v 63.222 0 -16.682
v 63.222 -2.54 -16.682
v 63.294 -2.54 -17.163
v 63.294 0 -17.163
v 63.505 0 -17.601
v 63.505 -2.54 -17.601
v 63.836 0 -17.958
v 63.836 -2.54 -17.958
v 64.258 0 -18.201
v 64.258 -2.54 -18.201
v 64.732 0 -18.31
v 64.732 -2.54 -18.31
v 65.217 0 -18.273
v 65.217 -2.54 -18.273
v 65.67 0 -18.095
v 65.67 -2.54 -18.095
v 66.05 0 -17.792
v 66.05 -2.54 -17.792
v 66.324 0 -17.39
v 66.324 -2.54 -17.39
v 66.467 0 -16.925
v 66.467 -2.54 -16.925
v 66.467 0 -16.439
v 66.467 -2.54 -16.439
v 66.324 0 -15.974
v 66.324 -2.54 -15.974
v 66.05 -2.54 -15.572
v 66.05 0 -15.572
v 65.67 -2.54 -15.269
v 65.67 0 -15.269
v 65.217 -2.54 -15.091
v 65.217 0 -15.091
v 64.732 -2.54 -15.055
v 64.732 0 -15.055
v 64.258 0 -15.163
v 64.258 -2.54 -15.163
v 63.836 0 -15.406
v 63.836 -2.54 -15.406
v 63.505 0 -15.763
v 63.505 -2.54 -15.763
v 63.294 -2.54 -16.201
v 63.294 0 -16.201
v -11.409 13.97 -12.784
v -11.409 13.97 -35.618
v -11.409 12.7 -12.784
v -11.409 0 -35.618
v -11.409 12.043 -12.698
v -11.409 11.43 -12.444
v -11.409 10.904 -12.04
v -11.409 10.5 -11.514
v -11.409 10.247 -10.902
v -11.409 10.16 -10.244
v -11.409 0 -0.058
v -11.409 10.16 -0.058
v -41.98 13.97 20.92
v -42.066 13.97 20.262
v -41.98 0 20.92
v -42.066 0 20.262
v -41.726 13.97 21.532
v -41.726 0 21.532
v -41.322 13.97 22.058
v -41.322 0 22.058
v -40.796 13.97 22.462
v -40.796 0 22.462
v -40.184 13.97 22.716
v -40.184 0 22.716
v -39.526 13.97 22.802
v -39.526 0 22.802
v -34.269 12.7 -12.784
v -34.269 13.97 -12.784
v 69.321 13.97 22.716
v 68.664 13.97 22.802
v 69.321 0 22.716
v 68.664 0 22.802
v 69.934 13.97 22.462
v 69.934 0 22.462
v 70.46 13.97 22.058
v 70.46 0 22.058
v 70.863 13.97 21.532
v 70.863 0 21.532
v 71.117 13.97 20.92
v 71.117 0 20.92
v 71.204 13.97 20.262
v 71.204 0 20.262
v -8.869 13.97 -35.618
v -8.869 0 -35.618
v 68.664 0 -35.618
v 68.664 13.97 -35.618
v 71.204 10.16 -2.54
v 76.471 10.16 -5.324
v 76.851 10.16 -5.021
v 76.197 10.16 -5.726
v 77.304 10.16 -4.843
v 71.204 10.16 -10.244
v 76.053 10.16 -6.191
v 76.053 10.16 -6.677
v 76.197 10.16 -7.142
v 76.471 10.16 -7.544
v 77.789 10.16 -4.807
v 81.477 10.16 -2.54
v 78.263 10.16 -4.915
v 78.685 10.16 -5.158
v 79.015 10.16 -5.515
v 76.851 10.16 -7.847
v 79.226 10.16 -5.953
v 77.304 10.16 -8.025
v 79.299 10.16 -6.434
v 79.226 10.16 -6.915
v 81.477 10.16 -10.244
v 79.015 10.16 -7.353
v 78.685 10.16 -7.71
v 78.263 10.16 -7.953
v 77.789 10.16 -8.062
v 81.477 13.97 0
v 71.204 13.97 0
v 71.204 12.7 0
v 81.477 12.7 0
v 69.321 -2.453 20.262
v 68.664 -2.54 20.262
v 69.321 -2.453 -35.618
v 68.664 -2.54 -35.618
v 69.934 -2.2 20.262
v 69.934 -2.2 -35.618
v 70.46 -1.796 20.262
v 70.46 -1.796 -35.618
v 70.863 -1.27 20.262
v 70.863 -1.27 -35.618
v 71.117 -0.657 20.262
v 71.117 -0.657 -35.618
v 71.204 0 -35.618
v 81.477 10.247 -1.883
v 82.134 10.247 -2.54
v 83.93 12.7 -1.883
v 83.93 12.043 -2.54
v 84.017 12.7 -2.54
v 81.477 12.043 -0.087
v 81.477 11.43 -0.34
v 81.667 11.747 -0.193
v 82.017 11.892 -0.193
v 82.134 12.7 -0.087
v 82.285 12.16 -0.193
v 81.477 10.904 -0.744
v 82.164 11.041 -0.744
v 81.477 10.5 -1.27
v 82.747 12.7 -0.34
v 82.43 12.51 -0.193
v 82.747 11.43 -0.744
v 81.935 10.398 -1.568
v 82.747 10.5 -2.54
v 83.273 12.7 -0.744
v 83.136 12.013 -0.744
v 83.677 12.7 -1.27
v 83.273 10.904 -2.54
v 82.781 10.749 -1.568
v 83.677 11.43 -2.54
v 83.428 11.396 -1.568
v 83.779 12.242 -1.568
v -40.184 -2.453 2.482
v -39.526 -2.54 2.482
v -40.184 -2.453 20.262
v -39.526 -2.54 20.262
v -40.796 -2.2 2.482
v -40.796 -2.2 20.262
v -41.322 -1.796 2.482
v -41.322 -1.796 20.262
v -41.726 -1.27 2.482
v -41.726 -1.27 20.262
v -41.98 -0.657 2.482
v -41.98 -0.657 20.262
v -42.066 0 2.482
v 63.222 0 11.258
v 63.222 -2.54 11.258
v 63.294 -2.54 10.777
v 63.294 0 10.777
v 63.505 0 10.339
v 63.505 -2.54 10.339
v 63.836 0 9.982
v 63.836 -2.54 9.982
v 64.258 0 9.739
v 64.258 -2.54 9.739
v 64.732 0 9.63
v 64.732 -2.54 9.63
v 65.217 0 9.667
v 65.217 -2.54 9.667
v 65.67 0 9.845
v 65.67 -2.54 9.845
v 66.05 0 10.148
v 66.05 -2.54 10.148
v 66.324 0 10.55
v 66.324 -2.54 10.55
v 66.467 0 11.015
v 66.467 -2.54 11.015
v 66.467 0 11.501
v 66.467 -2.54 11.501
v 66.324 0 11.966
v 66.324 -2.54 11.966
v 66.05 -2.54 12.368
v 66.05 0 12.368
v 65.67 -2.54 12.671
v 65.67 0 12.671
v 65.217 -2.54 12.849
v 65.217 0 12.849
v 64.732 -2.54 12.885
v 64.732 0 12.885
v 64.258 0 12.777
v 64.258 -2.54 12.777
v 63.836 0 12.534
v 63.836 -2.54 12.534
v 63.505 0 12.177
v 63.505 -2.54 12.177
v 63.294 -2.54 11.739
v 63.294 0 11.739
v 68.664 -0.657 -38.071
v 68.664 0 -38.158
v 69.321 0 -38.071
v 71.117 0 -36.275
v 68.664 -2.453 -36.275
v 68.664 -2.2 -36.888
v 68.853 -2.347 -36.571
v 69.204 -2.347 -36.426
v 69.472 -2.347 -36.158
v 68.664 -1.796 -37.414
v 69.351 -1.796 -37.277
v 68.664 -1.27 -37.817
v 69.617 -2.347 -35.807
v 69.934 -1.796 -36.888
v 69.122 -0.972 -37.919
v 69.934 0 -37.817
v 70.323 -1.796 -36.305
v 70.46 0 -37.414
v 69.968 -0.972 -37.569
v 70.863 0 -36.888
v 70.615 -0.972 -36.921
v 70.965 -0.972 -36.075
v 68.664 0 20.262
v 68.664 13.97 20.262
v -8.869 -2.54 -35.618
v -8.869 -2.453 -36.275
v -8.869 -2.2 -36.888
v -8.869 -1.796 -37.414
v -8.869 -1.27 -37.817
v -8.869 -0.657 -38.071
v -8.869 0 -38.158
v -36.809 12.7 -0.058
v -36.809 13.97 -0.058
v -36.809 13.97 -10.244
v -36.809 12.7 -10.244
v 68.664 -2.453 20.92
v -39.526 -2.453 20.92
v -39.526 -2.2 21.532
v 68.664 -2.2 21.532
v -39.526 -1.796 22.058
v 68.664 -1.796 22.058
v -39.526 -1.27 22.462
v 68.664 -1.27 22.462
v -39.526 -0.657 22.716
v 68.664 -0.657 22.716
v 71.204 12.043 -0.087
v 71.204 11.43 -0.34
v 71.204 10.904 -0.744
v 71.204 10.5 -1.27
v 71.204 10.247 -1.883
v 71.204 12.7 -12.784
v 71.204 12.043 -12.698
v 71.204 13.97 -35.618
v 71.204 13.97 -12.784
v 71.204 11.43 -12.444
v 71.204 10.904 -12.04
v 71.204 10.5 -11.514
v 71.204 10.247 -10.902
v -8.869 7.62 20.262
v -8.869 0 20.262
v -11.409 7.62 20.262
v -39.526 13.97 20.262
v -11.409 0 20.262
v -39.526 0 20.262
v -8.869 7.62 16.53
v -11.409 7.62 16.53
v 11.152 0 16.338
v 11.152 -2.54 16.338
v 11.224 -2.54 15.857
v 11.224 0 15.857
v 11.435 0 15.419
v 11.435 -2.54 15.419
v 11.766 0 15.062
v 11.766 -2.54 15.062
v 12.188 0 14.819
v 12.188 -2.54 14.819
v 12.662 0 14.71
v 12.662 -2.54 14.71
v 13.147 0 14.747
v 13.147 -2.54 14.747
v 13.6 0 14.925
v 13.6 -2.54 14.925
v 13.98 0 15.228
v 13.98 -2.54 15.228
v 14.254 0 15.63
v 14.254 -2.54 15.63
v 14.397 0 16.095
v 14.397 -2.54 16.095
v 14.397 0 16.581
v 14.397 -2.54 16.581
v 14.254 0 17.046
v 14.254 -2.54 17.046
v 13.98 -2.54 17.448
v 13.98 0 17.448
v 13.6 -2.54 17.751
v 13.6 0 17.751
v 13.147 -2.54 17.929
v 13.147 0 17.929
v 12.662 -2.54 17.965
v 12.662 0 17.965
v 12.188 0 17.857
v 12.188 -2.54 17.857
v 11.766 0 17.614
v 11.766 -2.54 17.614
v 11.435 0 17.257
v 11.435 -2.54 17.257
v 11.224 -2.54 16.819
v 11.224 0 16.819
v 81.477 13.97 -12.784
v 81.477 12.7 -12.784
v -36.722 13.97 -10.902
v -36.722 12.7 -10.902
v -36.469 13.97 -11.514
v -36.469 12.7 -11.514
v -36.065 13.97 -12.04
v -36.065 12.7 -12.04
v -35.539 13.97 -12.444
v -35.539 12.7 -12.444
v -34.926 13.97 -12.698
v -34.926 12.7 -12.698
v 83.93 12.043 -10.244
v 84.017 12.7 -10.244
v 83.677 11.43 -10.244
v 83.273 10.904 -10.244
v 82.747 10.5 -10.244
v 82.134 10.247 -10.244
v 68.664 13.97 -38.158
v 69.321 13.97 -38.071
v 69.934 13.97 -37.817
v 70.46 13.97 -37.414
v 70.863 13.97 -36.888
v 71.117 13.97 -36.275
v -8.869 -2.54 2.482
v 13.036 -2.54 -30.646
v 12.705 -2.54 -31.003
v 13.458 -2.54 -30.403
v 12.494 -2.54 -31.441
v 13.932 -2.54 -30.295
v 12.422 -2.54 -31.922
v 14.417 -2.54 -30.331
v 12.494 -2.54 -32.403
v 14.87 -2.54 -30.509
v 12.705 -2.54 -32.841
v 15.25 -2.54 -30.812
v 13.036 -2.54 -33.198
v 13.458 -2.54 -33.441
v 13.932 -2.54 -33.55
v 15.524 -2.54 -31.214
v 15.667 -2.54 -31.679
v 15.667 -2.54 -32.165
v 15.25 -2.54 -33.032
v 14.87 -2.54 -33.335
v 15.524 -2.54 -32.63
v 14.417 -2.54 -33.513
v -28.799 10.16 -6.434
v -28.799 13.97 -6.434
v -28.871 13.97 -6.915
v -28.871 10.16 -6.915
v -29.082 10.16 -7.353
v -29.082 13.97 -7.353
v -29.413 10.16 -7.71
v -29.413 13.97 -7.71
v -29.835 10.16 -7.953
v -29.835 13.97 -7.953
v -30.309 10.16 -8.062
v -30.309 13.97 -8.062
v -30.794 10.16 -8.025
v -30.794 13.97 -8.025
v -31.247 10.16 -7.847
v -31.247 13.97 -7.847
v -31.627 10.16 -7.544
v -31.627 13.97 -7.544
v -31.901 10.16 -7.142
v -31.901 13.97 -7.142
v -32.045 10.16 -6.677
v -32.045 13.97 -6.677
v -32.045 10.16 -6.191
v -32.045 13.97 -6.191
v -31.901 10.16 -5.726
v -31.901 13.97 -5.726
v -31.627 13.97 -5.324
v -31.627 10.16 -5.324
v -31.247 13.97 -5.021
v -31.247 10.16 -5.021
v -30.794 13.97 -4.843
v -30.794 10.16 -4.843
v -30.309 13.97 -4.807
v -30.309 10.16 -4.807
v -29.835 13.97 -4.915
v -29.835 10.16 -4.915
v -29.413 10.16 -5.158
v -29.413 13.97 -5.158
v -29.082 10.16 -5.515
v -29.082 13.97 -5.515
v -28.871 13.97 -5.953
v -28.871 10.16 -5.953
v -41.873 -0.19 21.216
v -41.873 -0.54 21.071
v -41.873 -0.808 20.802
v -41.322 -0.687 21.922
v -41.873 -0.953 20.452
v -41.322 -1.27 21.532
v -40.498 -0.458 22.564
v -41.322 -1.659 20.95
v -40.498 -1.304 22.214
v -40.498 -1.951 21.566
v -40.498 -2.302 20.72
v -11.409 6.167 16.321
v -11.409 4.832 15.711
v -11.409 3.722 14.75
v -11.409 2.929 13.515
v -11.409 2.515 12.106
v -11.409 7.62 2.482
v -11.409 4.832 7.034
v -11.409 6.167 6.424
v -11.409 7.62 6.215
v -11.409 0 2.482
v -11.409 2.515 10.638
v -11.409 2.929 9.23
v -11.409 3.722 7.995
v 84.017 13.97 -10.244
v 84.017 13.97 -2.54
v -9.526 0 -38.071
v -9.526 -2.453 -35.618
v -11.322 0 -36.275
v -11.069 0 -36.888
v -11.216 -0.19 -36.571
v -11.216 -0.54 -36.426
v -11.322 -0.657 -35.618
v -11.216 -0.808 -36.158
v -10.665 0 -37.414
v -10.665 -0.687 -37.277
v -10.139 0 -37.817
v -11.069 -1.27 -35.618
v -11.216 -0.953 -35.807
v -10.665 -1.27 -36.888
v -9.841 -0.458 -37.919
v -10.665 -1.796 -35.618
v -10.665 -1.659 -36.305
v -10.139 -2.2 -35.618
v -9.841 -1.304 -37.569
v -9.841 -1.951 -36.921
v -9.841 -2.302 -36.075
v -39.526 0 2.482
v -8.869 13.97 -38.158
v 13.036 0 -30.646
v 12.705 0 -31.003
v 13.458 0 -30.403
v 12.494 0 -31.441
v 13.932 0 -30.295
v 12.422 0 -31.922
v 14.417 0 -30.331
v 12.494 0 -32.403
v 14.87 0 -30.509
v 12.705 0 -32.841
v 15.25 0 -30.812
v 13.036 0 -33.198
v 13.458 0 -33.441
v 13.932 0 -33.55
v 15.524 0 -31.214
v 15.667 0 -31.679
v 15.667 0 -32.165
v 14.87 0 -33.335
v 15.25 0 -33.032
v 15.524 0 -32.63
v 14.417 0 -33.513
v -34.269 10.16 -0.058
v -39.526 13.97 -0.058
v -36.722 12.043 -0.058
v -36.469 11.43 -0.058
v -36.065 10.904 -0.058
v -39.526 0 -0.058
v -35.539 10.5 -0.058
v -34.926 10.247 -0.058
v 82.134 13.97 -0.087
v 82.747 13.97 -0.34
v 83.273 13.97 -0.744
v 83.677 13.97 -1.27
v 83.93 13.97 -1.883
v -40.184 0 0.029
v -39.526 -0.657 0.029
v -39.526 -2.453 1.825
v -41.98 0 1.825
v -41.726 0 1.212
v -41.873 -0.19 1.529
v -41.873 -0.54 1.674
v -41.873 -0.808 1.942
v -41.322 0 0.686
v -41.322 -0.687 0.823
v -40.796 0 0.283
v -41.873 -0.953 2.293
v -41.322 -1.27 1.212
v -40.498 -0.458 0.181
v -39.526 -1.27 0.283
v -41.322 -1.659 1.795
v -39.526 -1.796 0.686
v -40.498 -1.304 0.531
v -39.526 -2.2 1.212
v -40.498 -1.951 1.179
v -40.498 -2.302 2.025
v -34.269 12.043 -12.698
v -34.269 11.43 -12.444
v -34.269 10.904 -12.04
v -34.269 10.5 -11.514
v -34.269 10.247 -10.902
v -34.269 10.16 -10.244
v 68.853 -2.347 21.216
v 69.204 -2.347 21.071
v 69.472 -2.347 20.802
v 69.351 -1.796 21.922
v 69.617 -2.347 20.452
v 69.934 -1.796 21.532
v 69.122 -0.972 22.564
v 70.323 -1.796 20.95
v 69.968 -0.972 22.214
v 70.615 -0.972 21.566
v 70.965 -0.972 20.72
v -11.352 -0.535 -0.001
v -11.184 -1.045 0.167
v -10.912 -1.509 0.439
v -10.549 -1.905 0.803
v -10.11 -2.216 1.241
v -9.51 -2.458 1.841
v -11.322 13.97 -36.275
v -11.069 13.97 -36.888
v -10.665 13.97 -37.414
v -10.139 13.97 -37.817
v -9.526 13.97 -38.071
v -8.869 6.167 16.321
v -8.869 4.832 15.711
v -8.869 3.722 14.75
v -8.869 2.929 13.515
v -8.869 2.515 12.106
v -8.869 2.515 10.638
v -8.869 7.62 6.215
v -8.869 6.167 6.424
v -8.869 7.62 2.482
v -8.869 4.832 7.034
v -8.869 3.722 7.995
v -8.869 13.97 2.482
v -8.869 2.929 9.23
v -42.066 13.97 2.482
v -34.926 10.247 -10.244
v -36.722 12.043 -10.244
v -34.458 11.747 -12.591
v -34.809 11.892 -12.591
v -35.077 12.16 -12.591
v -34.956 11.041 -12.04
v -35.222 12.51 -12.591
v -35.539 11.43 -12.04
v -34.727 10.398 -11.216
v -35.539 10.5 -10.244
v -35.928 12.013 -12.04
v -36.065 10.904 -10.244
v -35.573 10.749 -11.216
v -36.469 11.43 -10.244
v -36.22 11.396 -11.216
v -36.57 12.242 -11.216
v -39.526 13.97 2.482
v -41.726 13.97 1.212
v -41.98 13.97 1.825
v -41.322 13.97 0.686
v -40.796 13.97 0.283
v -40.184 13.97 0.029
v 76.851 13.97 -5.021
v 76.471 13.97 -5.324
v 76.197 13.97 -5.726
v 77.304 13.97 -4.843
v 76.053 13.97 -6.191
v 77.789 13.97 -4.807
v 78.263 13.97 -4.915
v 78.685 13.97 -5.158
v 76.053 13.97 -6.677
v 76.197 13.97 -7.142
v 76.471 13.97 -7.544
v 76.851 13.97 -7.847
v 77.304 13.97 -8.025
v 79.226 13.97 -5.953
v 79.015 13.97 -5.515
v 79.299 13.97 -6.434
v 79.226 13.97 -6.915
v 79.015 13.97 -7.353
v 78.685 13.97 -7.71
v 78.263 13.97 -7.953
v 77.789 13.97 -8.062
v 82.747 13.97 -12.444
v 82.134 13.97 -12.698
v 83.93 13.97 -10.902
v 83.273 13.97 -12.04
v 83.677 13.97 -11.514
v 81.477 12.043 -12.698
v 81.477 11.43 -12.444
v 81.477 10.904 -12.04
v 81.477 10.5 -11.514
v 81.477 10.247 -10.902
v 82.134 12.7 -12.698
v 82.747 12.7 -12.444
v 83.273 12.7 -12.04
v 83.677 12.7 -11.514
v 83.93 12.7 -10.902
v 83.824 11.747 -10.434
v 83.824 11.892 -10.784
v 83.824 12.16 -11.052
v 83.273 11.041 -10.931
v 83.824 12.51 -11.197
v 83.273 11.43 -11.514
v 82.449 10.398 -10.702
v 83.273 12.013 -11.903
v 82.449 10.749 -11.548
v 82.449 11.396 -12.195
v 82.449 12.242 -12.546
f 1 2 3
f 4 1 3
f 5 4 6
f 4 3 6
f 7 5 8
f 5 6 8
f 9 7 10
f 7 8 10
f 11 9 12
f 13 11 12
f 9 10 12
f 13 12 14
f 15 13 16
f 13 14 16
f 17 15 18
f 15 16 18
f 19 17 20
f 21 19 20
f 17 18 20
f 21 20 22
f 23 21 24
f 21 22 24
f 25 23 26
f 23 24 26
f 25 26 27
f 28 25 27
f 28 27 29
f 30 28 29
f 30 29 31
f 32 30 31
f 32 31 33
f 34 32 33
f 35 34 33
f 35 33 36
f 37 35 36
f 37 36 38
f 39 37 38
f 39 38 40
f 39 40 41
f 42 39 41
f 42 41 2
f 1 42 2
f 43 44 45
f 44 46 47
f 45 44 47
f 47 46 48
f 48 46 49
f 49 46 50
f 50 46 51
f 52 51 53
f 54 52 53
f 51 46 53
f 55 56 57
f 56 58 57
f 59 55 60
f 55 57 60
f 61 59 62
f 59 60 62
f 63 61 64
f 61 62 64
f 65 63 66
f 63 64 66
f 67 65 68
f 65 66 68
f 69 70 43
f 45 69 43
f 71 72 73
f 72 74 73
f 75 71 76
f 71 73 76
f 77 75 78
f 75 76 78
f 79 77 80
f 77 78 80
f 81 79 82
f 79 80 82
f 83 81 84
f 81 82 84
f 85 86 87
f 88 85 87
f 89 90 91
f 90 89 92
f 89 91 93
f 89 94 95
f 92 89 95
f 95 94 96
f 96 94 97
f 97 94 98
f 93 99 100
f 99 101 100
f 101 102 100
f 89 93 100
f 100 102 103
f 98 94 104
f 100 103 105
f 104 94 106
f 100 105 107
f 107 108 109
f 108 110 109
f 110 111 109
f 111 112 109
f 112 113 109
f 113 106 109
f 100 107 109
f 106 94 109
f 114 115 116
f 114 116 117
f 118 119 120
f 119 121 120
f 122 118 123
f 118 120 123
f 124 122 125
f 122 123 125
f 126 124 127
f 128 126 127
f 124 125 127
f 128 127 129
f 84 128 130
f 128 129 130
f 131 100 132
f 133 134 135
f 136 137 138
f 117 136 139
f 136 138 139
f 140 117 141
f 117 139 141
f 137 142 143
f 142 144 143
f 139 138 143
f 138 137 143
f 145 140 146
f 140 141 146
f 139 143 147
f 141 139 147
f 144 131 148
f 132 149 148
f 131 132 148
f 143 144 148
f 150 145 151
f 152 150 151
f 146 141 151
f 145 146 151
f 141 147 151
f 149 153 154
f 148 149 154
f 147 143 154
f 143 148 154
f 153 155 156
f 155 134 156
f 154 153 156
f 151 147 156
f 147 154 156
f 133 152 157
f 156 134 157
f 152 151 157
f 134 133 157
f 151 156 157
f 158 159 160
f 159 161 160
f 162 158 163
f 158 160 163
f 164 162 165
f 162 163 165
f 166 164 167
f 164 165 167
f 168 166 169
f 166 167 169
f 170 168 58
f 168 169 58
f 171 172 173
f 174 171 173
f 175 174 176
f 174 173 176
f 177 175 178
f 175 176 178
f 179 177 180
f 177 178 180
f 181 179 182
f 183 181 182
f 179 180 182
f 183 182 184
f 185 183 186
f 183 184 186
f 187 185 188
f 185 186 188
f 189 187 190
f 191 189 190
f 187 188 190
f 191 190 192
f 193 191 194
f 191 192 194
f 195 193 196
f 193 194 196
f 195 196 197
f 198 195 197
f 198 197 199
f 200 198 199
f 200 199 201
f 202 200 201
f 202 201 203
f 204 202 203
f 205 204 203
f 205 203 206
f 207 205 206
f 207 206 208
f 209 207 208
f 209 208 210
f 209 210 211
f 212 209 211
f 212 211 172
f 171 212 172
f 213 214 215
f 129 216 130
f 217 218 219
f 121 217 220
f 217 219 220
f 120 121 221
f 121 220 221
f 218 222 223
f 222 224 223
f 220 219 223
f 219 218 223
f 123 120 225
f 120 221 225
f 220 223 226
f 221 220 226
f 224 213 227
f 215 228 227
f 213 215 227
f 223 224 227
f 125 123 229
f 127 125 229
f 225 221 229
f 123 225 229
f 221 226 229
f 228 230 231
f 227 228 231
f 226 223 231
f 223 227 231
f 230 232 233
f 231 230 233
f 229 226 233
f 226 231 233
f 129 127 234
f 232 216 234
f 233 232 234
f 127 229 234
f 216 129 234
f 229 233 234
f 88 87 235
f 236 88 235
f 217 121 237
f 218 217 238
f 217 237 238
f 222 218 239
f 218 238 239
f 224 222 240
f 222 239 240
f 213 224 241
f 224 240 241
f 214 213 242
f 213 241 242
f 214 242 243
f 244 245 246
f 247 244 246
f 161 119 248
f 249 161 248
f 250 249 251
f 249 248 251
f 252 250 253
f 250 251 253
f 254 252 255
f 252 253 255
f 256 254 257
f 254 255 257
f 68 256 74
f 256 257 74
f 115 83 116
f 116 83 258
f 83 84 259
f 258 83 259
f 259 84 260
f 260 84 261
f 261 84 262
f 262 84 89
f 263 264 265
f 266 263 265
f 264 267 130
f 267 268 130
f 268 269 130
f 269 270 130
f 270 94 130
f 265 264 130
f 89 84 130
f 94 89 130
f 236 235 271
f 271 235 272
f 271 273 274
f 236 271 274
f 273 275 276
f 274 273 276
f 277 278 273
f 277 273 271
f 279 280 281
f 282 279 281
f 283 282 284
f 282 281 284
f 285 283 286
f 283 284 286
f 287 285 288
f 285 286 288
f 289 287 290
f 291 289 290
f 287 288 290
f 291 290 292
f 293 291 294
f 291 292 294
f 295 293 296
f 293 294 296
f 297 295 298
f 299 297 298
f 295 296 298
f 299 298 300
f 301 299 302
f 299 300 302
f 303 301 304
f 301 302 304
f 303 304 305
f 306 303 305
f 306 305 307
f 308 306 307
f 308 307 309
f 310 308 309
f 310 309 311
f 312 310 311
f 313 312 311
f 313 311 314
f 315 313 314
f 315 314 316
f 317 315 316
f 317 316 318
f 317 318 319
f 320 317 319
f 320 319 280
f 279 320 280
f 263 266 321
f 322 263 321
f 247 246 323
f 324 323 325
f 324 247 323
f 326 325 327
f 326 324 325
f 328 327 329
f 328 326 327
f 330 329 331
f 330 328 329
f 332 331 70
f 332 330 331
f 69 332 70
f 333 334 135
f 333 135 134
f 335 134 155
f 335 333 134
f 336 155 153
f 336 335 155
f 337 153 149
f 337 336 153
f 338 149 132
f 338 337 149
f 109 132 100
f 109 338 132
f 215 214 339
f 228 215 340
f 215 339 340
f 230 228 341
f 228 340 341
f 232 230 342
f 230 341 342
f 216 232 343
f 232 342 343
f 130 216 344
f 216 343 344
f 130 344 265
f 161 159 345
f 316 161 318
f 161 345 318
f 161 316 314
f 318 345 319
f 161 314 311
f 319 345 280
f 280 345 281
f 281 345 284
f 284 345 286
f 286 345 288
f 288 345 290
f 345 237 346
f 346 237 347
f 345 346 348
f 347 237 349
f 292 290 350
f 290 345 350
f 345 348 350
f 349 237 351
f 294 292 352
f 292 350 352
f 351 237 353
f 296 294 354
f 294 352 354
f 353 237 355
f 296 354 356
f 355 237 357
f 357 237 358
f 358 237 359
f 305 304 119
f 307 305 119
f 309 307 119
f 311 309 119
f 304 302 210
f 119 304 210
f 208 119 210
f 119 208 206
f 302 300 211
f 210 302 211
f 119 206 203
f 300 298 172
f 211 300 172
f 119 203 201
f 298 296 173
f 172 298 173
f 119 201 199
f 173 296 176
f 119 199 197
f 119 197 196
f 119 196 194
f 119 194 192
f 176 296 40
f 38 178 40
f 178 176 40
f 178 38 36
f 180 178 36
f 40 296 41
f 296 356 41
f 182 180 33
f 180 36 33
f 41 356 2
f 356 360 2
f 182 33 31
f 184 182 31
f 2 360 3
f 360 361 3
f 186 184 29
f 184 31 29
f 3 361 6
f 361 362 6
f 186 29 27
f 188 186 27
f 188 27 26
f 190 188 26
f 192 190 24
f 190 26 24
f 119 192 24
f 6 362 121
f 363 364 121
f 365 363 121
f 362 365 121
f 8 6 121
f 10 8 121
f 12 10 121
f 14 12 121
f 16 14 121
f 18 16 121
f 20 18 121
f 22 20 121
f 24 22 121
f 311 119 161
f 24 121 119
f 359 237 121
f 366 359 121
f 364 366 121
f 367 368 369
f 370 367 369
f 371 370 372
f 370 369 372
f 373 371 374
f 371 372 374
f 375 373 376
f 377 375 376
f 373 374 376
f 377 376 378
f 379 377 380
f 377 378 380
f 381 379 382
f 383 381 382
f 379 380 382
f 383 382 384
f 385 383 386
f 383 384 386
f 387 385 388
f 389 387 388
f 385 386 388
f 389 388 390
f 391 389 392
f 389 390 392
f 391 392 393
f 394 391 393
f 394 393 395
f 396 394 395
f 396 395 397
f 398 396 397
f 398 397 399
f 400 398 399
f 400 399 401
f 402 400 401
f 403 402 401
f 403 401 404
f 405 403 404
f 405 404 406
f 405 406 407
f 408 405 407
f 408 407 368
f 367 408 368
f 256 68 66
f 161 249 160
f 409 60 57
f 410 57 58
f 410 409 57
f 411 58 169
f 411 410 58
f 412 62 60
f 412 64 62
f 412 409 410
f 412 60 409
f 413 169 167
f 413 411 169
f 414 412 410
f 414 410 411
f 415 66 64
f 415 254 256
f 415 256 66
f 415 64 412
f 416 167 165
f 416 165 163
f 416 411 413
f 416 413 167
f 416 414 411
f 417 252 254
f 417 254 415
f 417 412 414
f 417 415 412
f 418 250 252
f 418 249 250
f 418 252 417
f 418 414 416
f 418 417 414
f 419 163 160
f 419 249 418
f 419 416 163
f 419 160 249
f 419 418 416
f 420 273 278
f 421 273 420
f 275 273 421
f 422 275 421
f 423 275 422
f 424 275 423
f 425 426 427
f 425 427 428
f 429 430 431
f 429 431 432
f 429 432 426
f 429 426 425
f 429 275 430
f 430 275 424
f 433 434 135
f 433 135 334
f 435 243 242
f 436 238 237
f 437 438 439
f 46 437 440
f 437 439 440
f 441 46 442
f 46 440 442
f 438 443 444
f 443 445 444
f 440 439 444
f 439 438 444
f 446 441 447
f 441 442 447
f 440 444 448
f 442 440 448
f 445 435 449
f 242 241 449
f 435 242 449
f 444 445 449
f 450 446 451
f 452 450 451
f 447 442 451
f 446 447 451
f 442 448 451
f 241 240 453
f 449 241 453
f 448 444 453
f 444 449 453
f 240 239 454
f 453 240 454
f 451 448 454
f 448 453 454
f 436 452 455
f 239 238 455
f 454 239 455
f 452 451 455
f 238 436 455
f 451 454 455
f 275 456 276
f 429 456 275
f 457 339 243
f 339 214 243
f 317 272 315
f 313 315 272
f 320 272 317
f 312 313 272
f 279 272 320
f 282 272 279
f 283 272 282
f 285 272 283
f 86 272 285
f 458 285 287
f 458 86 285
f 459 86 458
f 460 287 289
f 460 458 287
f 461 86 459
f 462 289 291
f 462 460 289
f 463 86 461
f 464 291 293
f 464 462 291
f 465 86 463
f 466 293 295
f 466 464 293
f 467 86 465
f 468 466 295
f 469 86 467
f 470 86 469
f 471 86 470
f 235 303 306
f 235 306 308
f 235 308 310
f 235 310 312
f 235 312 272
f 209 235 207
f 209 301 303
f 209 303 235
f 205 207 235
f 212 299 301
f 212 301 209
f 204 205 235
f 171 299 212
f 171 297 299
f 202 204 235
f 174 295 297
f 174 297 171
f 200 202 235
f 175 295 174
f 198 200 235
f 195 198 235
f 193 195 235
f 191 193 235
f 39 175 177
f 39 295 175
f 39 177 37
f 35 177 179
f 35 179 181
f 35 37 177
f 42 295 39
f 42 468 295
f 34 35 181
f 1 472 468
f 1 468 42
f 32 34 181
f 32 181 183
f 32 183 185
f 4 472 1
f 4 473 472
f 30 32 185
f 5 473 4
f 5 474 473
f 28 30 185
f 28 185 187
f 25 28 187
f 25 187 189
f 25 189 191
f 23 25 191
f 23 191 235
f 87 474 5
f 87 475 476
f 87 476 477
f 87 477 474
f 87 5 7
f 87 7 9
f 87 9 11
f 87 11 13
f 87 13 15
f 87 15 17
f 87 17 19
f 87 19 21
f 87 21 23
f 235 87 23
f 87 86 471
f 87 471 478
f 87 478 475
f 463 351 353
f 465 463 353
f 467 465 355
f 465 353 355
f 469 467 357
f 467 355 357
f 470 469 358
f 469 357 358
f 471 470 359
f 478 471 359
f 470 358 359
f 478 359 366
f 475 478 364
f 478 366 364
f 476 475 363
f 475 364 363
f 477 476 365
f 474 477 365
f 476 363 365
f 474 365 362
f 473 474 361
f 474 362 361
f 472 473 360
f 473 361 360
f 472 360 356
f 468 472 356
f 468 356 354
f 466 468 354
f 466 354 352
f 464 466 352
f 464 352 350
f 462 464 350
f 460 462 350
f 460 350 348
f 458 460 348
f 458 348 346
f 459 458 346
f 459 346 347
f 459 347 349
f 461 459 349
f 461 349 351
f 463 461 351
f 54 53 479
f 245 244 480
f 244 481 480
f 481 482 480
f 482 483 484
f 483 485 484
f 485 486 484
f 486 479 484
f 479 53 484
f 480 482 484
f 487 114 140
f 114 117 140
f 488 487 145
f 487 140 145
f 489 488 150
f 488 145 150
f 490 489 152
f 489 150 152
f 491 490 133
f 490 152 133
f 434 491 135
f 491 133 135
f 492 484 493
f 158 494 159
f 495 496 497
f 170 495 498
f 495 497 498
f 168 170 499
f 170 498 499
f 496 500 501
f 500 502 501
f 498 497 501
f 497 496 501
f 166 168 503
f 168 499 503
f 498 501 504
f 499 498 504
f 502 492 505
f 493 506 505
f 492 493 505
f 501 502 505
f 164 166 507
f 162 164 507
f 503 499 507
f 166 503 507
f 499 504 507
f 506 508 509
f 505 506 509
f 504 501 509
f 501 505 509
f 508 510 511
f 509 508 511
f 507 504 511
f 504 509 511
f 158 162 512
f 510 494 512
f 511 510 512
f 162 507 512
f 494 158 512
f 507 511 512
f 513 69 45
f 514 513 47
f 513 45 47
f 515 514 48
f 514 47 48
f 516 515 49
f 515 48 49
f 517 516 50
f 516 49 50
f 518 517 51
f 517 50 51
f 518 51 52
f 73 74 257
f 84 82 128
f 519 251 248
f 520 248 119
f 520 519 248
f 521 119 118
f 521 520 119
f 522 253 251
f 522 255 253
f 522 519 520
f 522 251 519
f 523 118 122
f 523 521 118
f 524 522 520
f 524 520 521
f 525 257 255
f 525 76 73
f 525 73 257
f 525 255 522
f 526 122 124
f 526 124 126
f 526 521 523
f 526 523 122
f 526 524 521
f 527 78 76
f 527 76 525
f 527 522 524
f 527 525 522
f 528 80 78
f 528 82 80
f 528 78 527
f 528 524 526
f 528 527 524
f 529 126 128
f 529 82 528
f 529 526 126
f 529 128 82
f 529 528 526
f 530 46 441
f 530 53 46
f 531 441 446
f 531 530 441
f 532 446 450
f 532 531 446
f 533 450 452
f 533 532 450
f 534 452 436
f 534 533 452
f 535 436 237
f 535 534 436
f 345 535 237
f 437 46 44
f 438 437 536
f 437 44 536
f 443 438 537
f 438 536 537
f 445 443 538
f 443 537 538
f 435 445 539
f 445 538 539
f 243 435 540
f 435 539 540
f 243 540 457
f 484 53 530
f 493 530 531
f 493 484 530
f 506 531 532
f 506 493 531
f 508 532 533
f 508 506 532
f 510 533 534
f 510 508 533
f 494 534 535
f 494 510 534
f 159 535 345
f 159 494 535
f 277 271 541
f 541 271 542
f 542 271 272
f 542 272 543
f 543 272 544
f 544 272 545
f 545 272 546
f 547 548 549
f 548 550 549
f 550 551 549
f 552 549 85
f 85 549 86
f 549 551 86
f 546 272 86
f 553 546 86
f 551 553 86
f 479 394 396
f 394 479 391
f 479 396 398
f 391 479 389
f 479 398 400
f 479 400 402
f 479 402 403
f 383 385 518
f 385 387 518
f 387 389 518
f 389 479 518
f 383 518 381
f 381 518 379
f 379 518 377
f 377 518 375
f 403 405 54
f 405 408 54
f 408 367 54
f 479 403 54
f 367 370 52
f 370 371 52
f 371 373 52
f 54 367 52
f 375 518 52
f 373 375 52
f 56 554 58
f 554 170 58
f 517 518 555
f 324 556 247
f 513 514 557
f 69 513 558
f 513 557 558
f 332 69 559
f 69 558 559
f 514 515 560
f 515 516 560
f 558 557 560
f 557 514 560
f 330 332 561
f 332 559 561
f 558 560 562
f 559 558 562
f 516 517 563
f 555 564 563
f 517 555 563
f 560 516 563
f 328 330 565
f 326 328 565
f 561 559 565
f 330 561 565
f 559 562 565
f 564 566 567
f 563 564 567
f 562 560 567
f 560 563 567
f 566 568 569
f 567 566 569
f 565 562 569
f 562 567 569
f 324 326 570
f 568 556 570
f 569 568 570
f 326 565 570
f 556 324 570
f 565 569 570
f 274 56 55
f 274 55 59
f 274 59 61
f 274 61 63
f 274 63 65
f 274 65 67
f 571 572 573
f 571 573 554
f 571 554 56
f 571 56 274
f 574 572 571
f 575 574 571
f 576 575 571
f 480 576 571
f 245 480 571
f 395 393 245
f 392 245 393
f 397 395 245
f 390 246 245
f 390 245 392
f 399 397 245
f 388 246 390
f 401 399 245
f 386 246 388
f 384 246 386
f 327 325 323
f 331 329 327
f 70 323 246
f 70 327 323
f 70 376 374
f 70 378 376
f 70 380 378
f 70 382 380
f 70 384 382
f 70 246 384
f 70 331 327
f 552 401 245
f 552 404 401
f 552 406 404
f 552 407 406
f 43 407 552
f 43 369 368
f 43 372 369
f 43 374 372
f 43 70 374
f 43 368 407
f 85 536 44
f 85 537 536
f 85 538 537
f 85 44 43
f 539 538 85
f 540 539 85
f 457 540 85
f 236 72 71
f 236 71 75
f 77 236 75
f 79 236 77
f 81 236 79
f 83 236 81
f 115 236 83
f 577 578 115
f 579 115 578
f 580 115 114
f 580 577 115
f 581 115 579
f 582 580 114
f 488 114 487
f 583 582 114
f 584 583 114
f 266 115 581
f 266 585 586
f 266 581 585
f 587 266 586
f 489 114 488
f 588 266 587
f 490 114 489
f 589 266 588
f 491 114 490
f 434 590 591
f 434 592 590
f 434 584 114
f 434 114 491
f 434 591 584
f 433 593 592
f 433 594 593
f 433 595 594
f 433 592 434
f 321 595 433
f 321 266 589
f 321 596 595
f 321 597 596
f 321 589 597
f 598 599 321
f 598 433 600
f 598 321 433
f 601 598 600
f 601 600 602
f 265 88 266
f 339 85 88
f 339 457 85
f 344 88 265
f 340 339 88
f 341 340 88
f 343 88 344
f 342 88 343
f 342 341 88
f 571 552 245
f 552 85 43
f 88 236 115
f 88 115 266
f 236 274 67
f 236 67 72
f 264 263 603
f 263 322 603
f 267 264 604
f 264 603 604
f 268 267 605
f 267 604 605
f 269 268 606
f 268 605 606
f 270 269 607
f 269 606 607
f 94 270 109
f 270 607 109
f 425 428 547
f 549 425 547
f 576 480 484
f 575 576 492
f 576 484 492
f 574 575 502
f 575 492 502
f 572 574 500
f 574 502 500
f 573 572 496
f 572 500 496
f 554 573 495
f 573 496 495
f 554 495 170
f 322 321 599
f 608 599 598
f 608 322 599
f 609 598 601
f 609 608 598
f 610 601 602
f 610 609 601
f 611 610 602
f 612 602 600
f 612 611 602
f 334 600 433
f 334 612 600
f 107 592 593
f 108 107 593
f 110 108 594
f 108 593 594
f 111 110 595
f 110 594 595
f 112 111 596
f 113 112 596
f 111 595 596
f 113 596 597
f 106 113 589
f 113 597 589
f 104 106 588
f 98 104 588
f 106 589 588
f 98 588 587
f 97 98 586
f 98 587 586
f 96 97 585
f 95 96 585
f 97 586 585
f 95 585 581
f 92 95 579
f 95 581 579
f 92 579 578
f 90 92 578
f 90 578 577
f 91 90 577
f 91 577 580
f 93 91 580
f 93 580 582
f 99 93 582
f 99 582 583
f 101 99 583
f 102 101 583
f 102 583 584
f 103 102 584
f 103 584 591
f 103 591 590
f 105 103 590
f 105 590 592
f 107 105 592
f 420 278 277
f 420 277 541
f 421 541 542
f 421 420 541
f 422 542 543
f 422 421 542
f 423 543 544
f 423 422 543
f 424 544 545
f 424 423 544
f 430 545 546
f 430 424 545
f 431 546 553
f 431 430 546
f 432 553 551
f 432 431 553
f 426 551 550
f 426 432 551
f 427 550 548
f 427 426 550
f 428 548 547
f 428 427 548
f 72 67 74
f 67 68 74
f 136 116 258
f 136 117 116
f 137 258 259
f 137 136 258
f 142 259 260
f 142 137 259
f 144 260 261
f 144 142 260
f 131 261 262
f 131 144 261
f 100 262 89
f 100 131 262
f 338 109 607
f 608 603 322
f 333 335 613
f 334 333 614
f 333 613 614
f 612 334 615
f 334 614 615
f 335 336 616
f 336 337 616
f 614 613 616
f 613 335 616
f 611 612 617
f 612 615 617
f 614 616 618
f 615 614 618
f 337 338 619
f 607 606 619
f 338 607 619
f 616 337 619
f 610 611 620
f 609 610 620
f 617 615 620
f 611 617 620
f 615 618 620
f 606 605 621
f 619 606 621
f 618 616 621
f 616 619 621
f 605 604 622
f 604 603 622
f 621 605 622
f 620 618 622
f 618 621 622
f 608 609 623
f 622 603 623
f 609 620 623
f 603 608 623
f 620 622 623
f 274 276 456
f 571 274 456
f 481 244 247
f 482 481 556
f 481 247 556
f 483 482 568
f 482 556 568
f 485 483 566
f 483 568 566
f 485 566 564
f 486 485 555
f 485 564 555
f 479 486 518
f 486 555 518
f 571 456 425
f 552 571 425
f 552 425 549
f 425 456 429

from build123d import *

# Parameters (mm, degrees)
STOCK_LED_START                   = -2.54
STOCK_LED_LIGHT_HOUSING_1_DEPTH   = 2.54
STOCK_LED_LIGHT_HOUSING_1_2_DEPTH = 13.97
SKETCH3_W                         = 2.54
SKETCH3_H                         = 17.78
PIECE_UNDER_BATTERY_PLUG_DEPTH    = 7.62
CUT_OUT_FOR_PLUG_REACH            = 94.065
SKETCH4_R                         = 5.157413323
HOLES_FOR_SCREWS_D                = 3.2639
SKETCH7_W                         = 25.4
SKETCH7_H                         = 12.726484406
SKETCH7_W_2                       = 12.813224924
SKETCH7_H_2                       = 12.784135739
NAILS_GO_HERE_DEPTH               = 3.81
NAIL_HOLES_D                      = 3.2639
FILLET1_R                         = 2.54


# Read off the part's stored shape, not the designer's step: Stock-LED Light housing-1
with BuildPart() as part:
    # Stock-LED Light housing-1 outline → Stock-LED Light housing-1 (new body)
    with BuildSketch(Plane(origin=(0, 0, 0), x_dir=(1, 0, 0), z_dir=(0, 1, 0)).offset(STOCK_LED_START)):
        Polygon((71.203772107, -22.802348667), (71.203772107, 38.157651333), (-11.408866572, 38.157651333), (-11.408866572, 0.057651333), (-42.066153873, 0.057651333), (-42.066153873, -22.802348667), align=None)
    extrude(amount=STOCK_LED_LIGHT_HOUSING_1_DEPTH)

    # Stock-LED Light housing-1 2 outline → Stock-LED Light housing-1 2 (add)
    with BuildSketch(Plane(origin=(0, 0, 0), x_dir=(1, 0, 0), z_dir=(0, 1, 0))):
        Polygon((71.203772107, -22.802348667), (71.203772107, 38.157651333), (-11.408866572, 38.157651333), (-11.408866572, 0.057651333), (-42.066153873, 0.057651333), (-42.066153873, -22.802348667), align=None)
        Polygon((-39.526153873, -20.262348667), (-39.526153873, -2.482348667), (-8.868866572, -2.482348667), (-8.868866572, 35.617651333), (68.663772107, 35.617651333), (68.663772107, -20.262348667), align=None, mode=Mode.SUBTRACT)
    extrude(amount=STOCK_LED_LIGHT_HOUSING_1_2_DEPTH)

    # Sketch3 → Piece under battery plug (add)
    with BuildSketch(Plane(origin=(0, 0, 0), x_dir=(1, 0, 0), z_dir=(0, 1, 0))):
        with Locations((-10.138866572, -11.372348667)):
            Rectangle(SKETCH3_W, SKETCH3_H)
    extrude(amount=PIECE_UNDER_BATTERY_PLUG_DEPTH)

    # Sketch4 → Cut out for plug (cut, up to next)
    with BuildSketch(Plane(origin=(-11.408866572, 0, 0), x_dir=(0, 0, -1), z_dir=(1, 0, 0)), mode=Mode.PRIVATE) as cut_out_for_plug_sk1:
        with Locations((-11.372348667, 7.62)):
            Circle(SKETCH4_R)
    cut_out_for_plug_tool1 = extrude(cut_out_for_plug_sk1.sketch, amount=CUT_OUT_FOR_PLUG_REACH, mode=Mode.PRIVATE) & part.part
    add(cut_out_for_plug_tool1.solids().sort_by_distance((-11.408867, 7.62, 11.372349))[0], mode=Mode.SUBTRACT)

    # holes for screws (through all)
    with Locations(Plane(origin=(0, 0, 0), x_dir=(1, 0, 0), z_dir=(0, 1, 0))):
        with Locations((14.053772107, 31.922137324), (12.783772107, -16.337862676), (64.853772107, -11.257862676), (64.853772107, 16.682137324)):
            Hole(HOLES_FOR_SCREWS_D / 2)

    # Sketch7 → Nails go here (add)
    with BuildSketch(Plane(origin=(0, 13.97, 0), x_dir=(1, 0, 0), z_dir=(0, 1, 0))):
        with Locations((-24.108866572, 6.420893536)):
            Rectangle(SKETCH7_W, SKETCH7_H)
        with Locations((77.610384569, 6.39206787)):
            Rectangle(SKETCH7_W_2, SKETCH7_H_2)
    extrude(amount=-NAILS_GO_HERE_DEPTH)

    # Nail holes (through all)
    with Locations(Plane(origin=(0, 10.16, 0), x_dir=(-1, 0, 0), z_dir=(0, -1, 0))):
        with Locations((30.430786564, 6.434135739), (-77.666997031, 6.434135739)):
            Hole(NAIL_HOLES_D / 2)

    # Fillet1
    fillet1_edges = [part.edges().sort_by_distance(p)[0] for p in [
        (71.203772107, 5.715, -38.157651333),
        (71.203772107, 5.715, 22.802348667),
        (-36.808866572, 10.16, -6.420893536),
        (-24.108866572, 10.16, -12.784135739),
        (-36.808866572, 12.065, -12.784135739),
        (77.610384569, 10.16, -12.784135739),
        (84.016997031, 10.16, -6.392067869),
        (84.016997031, 12.065, -12.784135739),
        (77.610384569, 10.16, 0),
        (84.016997031, 12.065, 0),
        (-26.737510222, -2.54, -0.057651333),
        (14.568809117, -2.54, 22.802348667),
        (29.897452767, -2.54, -38.157651333),
        (-42.066153873, 5.715, 22.802348667),
        (-42.066153873, 5.715, -0.057651333),
        (-42.066153873, -2.54, 11.372348667),
        (71.203772107, -2.54, -7.677651333),
        (-11.408866572, 5.715, -38.157651333),
        (-11.408866572, -2.54, -19.107651333),
    ]]
    fillet(fillet1_edges, radius=FILLET1_R)


solid = part.part
